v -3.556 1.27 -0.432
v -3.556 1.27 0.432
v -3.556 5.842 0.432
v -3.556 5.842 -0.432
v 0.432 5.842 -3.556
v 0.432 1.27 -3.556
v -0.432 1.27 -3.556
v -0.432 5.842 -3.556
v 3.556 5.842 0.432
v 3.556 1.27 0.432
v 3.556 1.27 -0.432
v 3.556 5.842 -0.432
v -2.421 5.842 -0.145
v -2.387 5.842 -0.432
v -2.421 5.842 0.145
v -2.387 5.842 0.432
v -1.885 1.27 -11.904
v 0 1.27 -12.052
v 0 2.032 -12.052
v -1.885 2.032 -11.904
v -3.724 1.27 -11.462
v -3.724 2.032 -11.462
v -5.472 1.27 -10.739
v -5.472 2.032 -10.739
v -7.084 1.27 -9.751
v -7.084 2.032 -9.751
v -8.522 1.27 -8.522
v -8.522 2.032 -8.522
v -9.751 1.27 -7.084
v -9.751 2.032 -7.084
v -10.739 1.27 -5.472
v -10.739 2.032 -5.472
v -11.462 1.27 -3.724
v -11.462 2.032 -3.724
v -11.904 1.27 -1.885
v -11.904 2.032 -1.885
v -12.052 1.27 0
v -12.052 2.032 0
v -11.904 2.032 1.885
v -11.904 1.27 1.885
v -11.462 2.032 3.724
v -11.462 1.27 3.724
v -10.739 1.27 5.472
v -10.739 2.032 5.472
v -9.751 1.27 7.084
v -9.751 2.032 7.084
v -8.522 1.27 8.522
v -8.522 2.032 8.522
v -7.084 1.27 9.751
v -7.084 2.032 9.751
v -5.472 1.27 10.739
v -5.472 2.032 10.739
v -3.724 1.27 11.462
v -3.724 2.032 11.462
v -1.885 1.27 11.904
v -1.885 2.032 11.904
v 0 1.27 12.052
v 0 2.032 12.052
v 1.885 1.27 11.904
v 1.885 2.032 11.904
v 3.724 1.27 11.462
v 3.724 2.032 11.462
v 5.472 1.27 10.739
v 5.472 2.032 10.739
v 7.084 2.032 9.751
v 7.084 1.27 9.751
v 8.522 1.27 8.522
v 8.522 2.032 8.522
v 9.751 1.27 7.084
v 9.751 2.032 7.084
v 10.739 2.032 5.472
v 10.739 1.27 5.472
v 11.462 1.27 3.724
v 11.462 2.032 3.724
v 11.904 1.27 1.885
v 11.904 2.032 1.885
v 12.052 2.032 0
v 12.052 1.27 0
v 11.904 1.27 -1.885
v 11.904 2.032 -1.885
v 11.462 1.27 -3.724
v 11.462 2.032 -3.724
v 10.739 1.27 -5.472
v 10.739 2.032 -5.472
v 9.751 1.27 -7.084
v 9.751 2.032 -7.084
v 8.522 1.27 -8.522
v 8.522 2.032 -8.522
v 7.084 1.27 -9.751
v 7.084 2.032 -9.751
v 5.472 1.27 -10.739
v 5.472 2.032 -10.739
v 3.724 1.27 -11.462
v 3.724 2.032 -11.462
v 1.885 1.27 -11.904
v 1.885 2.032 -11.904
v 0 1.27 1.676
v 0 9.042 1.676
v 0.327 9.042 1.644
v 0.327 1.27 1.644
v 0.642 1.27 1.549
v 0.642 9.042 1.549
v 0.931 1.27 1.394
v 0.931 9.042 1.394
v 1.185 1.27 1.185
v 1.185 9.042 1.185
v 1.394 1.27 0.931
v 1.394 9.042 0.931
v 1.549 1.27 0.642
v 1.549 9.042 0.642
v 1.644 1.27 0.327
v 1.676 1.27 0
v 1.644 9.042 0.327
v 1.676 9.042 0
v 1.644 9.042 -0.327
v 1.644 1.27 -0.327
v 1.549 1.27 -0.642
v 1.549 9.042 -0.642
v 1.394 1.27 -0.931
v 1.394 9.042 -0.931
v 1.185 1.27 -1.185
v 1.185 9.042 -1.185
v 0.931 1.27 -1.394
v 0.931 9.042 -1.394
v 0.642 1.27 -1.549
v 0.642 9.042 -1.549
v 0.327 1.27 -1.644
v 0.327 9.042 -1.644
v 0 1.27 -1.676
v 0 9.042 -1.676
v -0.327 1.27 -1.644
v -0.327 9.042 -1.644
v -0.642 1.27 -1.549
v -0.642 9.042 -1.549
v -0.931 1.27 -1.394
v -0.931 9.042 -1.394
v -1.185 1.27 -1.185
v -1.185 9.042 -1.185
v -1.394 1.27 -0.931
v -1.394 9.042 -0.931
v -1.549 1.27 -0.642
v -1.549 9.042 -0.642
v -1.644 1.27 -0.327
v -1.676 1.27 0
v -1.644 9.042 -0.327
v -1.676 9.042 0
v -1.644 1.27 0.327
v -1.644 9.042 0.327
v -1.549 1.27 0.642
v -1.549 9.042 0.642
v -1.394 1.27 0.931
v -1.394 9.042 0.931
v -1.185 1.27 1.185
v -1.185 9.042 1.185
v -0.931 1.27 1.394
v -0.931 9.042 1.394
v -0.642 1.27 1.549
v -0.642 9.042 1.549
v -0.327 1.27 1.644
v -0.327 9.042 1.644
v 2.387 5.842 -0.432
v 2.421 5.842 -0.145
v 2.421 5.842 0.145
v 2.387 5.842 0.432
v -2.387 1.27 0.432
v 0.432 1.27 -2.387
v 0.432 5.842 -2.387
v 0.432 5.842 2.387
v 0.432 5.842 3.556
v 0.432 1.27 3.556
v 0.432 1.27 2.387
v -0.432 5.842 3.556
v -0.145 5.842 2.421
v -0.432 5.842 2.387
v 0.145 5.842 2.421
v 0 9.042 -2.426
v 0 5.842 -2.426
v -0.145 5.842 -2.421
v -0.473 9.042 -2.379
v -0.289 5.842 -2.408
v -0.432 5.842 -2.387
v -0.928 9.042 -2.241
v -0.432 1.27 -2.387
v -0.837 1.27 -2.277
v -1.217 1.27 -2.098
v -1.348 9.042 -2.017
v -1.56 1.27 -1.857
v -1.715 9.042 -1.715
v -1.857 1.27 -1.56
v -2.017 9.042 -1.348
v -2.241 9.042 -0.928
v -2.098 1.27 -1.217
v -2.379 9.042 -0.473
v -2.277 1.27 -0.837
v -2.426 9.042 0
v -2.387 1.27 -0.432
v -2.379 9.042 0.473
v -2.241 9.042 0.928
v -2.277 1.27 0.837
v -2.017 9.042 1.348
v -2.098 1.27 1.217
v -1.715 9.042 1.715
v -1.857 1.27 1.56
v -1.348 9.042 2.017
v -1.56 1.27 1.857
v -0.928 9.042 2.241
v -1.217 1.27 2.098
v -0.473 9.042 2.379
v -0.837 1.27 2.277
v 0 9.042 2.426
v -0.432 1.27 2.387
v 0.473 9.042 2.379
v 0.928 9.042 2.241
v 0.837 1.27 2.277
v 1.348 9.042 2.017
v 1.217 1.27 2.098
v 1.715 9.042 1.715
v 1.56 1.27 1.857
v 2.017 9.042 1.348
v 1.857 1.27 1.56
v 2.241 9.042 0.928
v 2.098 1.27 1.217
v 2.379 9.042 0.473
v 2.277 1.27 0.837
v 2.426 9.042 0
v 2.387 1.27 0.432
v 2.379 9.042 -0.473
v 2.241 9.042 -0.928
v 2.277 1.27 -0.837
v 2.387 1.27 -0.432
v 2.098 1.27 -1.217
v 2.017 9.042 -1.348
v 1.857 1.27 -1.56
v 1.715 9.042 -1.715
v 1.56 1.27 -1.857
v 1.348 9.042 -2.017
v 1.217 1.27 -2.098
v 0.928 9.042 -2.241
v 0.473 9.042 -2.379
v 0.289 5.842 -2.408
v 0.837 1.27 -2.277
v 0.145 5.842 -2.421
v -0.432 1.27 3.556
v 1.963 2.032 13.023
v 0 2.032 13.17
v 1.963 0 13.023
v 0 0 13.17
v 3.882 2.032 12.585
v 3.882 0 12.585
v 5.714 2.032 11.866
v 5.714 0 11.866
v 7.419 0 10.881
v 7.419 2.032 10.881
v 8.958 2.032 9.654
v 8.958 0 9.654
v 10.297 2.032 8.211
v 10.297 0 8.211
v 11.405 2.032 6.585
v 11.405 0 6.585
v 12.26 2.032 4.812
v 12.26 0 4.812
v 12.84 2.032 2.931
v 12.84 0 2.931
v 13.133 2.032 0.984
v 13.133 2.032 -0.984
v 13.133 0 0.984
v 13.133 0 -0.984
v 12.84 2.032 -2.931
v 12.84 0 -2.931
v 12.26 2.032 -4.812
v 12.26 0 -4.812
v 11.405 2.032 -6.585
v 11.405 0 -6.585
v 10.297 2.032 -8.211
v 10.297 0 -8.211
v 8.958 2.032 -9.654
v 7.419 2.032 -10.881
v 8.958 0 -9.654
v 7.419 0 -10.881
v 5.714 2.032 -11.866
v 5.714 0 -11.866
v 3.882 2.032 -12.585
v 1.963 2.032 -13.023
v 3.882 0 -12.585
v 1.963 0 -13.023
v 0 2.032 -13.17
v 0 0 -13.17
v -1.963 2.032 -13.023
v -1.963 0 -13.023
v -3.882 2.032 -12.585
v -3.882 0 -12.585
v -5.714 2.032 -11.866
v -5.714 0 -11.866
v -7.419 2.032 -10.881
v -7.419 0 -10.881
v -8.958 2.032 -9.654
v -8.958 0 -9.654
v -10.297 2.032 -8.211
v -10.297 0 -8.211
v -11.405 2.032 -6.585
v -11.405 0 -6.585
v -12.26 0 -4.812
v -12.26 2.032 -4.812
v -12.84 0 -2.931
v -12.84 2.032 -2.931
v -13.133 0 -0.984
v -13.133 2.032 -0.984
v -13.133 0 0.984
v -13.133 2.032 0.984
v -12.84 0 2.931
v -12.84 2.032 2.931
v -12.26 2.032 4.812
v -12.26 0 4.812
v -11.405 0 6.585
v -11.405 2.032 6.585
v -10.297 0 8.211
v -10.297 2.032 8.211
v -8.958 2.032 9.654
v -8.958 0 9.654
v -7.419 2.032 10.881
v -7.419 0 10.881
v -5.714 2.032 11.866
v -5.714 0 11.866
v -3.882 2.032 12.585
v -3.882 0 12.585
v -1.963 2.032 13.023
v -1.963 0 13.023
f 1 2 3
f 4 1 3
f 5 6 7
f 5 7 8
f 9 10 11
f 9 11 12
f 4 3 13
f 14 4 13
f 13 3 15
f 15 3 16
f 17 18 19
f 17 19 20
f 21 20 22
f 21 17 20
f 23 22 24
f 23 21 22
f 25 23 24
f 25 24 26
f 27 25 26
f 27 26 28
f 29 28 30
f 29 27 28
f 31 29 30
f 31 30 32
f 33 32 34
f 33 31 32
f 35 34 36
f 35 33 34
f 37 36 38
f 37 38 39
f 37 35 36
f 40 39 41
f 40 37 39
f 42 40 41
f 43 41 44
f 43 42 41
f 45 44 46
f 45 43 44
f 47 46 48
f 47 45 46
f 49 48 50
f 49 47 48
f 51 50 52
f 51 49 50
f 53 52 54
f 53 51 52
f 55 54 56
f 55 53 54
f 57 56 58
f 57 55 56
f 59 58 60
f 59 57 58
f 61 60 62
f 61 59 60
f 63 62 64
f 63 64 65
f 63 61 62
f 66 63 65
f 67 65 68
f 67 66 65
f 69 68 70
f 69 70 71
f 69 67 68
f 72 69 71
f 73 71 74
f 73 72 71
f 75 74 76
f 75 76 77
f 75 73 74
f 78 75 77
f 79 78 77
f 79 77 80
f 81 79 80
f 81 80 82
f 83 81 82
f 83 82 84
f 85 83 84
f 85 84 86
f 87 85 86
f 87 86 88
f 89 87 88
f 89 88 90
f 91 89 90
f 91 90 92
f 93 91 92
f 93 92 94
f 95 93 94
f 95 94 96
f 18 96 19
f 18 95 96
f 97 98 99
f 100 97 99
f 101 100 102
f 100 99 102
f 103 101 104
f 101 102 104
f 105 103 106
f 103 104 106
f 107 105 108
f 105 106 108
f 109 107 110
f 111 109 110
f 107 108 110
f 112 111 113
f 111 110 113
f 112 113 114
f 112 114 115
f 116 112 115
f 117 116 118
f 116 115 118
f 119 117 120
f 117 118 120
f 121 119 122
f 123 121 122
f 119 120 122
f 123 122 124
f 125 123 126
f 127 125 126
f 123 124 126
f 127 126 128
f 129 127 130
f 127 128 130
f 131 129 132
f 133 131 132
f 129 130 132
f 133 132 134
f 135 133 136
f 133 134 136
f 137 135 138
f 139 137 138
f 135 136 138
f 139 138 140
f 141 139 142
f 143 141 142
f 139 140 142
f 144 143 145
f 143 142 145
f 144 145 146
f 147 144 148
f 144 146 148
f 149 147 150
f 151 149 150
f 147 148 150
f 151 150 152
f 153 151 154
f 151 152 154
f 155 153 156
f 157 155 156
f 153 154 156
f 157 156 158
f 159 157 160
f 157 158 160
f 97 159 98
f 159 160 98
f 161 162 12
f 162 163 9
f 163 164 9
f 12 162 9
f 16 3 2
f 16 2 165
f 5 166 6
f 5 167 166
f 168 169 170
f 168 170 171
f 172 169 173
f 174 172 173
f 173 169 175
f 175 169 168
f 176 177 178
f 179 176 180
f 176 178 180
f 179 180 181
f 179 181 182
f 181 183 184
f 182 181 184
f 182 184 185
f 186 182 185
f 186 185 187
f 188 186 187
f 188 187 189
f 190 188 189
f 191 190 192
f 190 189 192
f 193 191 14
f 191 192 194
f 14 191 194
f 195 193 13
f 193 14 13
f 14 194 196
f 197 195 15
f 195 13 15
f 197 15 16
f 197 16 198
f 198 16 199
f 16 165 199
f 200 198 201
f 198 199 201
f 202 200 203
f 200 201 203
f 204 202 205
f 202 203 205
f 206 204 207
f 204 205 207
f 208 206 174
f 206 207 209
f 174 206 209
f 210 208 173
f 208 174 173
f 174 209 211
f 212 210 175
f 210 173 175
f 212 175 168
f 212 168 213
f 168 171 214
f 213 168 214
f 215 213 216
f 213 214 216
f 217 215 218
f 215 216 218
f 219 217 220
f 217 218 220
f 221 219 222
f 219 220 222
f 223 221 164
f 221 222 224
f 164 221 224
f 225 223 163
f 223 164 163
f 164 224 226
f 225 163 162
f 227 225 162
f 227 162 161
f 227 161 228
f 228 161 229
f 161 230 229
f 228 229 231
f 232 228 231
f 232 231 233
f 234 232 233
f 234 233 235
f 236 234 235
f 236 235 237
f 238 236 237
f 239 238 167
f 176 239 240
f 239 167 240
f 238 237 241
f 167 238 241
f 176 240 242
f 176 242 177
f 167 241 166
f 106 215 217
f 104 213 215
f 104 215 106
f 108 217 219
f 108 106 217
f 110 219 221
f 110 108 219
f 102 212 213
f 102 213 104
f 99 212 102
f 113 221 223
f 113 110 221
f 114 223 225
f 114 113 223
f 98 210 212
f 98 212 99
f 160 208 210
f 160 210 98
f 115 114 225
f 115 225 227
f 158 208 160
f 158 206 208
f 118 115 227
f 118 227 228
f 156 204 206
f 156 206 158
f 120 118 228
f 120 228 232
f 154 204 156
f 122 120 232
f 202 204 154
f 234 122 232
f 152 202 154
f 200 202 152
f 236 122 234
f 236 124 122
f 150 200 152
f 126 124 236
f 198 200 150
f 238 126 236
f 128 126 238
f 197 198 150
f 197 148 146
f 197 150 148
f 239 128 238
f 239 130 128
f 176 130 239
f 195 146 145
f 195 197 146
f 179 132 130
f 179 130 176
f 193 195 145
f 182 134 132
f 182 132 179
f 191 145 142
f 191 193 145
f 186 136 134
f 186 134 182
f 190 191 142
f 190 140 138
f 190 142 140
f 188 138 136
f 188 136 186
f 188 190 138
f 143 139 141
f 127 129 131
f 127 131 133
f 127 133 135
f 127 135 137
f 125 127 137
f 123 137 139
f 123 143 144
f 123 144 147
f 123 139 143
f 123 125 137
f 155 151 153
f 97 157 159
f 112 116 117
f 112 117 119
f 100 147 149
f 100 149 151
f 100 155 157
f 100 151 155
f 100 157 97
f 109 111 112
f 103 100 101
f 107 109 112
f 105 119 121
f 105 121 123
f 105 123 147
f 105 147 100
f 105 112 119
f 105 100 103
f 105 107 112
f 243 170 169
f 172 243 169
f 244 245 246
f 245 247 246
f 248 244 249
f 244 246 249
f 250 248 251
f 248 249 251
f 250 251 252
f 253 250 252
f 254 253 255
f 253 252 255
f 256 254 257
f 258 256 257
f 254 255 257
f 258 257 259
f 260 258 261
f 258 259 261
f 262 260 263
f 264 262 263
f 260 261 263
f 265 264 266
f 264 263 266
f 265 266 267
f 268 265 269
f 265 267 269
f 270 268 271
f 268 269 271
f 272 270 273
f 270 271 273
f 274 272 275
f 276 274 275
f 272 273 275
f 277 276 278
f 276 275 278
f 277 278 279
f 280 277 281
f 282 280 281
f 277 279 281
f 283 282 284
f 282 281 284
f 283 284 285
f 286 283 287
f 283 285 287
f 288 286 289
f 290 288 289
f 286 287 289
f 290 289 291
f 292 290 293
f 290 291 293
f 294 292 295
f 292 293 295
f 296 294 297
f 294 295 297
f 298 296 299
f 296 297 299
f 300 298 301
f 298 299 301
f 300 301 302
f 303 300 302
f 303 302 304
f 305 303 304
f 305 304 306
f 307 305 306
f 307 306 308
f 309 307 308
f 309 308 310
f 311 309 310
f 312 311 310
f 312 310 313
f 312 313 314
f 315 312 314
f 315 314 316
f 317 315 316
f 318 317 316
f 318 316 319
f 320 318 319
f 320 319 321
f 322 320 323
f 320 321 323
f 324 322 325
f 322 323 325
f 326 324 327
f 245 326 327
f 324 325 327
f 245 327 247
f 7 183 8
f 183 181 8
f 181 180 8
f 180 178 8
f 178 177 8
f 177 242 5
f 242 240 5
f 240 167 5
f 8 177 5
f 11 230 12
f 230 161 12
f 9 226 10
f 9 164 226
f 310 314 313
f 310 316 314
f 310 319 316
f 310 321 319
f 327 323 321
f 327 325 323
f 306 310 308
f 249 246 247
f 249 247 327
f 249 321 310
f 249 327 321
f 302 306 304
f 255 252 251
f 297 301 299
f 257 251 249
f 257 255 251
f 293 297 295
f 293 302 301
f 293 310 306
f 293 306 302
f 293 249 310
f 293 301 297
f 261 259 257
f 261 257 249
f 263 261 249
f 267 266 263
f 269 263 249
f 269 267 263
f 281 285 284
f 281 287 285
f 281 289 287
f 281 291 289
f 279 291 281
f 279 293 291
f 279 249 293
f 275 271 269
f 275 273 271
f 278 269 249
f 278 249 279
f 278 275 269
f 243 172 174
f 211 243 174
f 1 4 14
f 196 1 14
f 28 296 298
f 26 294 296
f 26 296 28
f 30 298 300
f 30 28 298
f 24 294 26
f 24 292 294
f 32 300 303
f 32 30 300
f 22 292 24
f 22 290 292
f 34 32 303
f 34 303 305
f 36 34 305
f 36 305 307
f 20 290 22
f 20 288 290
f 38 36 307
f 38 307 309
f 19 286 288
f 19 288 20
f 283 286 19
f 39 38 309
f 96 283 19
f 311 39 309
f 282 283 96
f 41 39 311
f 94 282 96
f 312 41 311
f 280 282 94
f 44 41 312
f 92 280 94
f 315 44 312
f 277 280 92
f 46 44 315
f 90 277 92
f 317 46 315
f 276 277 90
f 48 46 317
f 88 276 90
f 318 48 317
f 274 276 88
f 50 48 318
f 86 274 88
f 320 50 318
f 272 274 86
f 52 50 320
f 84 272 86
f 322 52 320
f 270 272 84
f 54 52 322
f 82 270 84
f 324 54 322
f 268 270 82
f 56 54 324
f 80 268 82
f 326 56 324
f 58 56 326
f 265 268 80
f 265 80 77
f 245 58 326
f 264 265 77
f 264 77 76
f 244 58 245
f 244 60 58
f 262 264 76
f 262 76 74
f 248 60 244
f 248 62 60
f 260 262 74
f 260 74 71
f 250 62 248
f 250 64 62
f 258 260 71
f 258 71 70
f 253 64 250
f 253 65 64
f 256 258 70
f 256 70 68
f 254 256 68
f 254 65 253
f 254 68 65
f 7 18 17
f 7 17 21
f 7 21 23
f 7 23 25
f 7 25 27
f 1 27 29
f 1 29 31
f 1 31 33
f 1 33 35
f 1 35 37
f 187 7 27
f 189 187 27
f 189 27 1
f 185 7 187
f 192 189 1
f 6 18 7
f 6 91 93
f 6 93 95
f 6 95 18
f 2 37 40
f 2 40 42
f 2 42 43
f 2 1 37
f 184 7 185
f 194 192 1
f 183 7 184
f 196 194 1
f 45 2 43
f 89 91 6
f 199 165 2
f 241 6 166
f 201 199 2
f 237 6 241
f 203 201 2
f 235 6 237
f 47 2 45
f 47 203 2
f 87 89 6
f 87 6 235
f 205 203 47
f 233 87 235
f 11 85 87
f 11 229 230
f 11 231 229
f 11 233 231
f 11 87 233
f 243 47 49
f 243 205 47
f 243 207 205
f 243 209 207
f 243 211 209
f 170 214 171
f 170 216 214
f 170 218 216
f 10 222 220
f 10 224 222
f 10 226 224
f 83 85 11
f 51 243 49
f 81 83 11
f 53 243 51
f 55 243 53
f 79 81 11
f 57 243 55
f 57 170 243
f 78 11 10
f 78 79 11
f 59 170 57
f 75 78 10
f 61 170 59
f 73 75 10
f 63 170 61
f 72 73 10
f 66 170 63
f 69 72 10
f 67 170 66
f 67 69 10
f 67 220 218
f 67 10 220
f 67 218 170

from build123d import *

# Parameters (mm, degrees)
SKETCH1_R           = 13.1699
BOSS_EXTRUDE1_DEPTH = 1.27
SKETCH2_R           = 13.1699
SKETCH2_R_2         = 12.0523
BOSS_EXTRUDE2_DEPTH = 0.762
SKETCH3_R           = 2.4257
BOSS_EXTRUDE3_DEPTH = 7.7724
SKETCH6_W           = 7.112
SKETCH6_H           = 5.842
BOSS_EXTRUDE4_DEPTH = 0.4318
SKETCH7_W           = 7.112
SKETCH7_H           = 5.842
BOSS_EXTRUDE5_DEPTH = 0.4318
SKETCH4_R           = 1.6764
CUT_EXTRUDE1_DEPTH  = 7.7724


with BuildPart() as part:
    # Sketch1 → Boss-Extrude1 (new body)
    with BuildSketch(Plane(origin=(0, 0, 0), x_dir=(1, 0, 0), z_dir=(0, 1, 0))):
        with Locations(Location((0, 0, 0), (0, 0, 270))):
            Circle(SKETCH1_R)
    extrude(amount=BOSS_EXTRUDE1_DEPTH)

    # Sketch2 → Boss-Extrude2 (add)
    with BuildSketch(Plane(origin=(0, 1.27, 0), x_dir=(1, 0, 0), z_dir=(0, 1, 0))):
        with Locations(Location((0, 0, 0), (0, 0, 270))):
            Circle(SKETCH2_R)
        with Locations(Location((0, 0, 0), (0, 0, 90))):
            Circle(SKETCH2_R_2, mode=Mode.SUBTRACT)
    extrude(amount=BOSS_EXTRUDE2_DEPTH)

    # Sketch3 → Boss-Extrude3 (add)
    with BuildSketch(Plane(origin=(0, 1.27, 0), x_dir=(1, 0, 0), z_dir=(0, 1, 0))):
        with Locations(Location((0, 0, 0), (0, 0, 90))):
            Circle(SKETCH3_R)
    extrude(amount=BOSS_EXTRUDE3_DEPTH)

    # Sketch6 → Boss-Extrude4 (add, symmetric)
    with BuildSketch(Plane.XY):
        with Locations((0, 2.921)):
            Rectangle(SKETCH6_W, SKETCH6_H)
    extrude(amount=BOSS_EXTRUDE4_DEPTH, both=True)

    # Sketch7 → Boss-Extrude5 (add, symmetric)
    with BuildSketch(Plane(origin=(0, 0, 0), x_dir=(0, 0, -1), z_dir=(1, 0, 0))):
        with Locations((0, 2.921)):
            Rectangle(SKETCH7_W, SKETCH7_H)
    extrude(amount=BOSS_EXTRUDE5_DEPTH, both=True)

    # Sketch4 → Cut-Extrude1 (cut)
    with BuildSketch(Plane(origin=(0, 9.0424, 0), x_dir=(1, 0, 0), z_dir=(0, 1, 0))):
        with Locations(Location((0, 0, 0), (0, 0, 270))):
            Circle(SKETCH4_R)
    extrude(amount=-CUT_EXTRUDE1_DEPTH, mode=Mode.SUBTRACT)


solid = part.part
